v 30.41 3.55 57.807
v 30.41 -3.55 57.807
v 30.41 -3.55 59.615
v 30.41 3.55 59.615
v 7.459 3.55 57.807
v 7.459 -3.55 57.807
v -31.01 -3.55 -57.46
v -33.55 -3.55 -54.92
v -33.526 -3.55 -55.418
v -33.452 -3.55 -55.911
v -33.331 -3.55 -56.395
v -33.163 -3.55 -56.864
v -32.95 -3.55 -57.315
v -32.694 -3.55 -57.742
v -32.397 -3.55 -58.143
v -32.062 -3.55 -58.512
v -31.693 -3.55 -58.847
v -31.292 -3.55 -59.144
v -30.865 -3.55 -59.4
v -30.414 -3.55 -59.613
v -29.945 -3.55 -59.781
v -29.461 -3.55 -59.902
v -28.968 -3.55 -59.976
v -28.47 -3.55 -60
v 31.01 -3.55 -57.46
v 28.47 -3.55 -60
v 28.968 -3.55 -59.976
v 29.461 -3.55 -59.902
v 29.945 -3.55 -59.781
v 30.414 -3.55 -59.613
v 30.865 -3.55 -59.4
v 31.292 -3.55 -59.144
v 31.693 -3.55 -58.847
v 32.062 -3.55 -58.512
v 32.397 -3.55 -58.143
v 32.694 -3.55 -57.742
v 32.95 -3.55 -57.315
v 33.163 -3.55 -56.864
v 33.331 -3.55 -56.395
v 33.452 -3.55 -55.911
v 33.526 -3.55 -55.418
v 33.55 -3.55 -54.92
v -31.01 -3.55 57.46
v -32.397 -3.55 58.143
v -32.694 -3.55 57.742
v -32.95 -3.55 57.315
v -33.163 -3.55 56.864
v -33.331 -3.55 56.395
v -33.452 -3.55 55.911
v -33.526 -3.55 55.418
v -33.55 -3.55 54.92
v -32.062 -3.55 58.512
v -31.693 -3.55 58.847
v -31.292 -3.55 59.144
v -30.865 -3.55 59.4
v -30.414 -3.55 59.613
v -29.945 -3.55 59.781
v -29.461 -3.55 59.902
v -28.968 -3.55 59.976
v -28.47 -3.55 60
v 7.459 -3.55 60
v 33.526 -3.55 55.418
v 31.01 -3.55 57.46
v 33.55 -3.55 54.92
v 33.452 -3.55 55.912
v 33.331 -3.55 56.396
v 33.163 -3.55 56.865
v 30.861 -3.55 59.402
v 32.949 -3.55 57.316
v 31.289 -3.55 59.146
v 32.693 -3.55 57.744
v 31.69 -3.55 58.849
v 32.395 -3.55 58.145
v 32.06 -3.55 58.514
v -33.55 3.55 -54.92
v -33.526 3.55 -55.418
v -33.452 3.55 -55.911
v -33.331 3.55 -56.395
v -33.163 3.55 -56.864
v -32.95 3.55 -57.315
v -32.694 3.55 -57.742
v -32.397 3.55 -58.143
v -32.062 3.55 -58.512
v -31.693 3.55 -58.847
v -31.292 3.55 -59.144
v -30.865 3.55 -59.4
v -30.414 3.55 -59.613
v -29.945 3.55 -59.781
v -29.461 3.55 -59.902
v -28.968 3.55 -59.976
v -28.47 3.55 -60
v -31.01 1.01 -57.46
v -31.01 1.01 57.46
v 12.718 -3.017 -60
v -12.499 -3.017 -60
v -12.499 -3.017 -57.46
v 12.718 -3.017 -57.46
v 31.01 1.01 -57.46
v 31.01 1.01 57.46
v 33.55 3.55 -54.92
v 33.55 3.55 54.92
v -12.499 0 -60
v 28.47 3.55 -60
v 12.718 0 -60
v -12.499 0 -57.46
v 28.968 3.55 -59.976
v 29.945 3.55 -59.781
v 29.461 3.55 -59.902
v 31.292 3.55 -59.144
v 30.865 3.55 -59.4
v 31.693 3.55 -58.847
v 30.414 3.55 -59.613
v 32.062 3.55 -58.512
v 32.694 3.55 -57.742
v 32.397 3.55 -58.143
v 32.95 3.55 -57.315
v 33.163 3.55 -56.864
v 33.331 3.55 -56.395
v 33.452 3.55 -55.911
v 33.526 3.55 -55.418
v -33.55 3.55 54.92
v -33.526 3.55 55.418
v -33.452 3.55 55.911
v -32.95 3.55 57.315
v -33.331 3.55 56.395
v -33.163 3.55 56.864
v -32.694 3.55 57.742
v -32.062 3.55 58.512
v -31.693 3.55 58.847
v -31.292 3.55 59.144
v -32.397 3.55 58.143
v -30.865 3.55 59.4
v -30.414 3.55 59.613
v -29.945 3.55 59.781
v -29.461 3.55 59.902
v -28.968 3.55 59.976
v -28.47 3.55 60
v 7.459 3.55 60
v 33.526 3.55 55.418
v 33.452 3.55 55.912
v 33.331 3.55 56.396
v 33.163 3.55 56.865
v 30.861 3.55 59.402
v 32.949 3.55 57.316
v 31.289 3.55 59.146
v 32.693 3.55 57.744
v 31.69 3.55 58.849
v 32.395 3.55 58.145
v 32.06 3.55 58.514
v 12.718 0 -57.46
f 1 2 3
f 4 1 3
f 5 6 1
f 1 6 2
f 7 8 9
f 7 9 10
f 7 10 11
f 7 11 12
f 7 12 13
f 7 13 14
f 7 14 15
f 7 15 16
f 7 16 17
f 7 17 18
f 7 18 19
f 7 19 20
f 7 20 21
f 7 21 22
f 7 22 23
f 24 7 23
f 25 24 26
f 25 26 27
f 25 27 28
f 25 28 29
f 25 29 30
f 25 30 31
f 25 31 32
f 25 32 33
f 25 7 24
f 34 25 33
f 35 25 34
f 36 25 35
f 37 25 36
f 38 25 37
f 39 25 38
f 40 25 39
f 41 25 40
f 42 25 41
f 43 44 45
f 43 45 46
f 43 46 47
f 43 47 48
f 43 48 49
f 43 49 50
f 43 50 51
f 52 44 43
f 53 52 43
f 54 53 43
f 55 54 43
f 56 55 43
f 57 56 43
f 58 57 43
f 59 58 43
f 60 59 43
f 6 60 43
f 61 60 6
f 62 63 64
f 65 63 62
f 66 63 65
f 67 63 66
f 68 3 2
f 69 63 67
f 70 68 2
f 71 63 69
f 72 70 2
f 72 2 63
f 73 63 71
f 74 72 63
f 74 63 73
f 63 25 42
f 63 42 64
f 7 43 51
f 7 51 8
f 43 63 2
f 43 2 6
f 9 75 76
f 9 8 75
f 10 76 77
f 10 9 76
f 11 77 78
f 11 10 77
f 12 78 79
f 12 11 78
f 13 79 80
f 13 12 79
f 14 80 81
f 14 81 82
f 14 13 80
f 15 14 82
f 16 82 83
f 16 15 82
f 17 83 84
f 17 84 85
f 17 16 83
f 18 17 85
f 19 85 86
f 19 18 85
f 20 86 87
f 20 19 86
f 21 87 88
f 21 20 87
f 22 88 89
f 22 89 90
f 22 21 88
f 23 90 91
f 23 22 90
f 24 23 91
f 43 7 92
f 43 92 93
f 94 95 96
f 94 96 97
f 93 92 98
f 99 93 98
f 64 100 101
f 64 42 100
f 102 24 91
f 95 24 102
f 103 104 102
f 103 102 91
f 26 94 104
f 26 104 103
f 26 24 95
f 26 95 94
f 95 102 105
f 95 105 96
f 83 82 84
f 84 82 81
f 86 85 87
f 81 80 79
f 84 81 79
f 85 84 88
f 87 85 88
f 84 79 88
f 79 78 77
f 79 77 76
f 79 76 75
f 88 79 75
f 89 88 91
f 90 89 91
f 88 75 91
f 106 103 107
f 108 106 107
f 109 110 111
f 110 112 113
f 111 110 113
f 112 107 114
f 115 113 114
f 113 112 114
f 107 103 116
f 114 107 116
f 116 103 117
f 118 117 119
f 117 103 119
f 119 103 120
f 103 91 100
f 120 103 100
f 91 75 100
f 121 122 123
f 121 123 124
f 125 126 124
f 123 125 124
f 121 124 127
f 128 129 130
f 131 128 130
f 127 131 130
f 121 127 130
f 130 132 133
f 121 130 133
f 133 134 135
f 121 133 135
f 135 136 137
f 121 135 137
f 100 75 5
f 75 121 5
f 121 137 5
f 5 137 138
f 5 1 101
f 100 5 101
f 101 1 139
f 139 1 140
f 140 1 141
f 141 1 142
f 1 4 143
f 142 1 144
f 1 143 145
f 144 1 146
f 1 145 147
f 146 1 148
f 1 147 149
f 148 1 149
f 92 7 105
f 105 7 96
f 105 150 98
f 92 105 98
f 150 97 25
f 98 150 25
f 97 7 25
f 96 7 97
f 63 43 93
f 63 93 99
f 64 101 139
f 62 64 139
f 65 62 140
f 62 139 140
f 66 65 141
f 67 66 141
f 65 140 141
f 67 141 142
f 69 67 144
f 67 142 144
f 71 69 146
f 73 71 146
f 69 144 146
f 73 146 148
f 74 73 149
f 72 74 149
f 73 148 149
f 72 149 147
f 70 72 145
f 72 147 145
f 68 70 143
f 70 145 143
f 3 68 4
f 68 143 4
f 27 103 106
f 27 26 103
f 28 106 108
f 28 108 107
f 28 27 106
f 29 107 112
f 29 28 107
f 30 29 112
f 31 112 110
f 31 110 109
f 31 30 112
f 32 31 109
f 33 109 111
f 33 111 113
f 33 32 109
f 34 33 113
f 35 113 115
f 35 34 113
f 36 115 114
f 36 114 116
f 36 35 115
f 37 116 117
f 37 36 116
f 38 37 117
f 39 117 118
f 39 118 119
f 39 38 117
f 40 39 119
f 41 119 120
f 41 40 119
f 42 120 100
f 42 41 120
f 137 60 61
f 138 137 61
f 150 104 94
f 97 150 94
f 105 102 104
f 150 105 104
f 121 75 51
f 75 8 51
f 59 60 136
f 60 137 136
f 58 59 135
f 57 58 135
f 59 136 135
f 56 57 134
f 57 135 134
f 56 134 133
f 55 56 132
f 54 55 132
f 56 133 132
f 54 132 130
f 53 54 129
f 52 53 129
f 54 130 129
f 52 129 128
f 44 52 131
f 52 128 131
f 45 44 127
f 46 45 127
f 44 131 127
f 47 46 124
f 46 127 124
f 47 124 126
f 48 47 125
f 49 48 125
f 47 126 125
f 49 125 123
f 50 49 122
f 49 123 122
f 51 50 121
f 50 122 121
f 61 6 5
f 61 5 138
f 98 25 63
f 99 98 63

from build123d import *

# Parameters (mm, degrees)
F0_W      = 67.1
F0_H      = 120
F1_DEPTH  = 3.55
F2_T      = -2.54
F3_R      = 5.08
F4_R      = 5.08
F5_R      = 5.08
F6_R      = 5.08
F7_W      = 22.950821
F7_H      = 8.032788
F8_DEPTH  = 12.5
F9_W      = 25.217273
F9_H      = 3.016623
F10_DEPTH = 12.5


with BuildPart() as f1:
    # F0 (on Front) → F1 (new body, symmetric)
    with BuildSketch(Plane.XZ):
        Rectangle(F0_W, F0_H)
    extrude(amount=F1_DEPTH, both=True)

    # F2
    f2_openings = [f1.faces().sort_by_distance(p)[0] for p in [
        (0, -3.55, 0),
    ]]
    offset(amount=F2_T, openings=f2_openings)

    # F3
    f3_edges = [f1.edges().sort_by_distance(p)[0] for p in [
        (33.55, 0, 60),
    ]]
    fillet(f3_edges, radius=F3_R)

    # F4
    f4_edges = [f1.edges().sort_by_distance(p)[0] for p in [
        (-33.55, 0, 60),
    ]]
    fillet(f4_edges, radius=F4_R)

    # F5
    f5_edges = [f1.edges().sort_by_distance(p)[0] for p in [
        (-33.55, 0, -60),
    ]]
    fillet(f5_edges, radius=F5_R)

    # F6
    f6_edges = [f1.edges().sort_by_distance(p)[0] for p in [
        (33.55, 0, -60),
    ]]
    fillet(f6_edges, radius=F6_R)

    # F7 (on Front) → F8 (cut, symmetric)
    with BuildSketch(Plane.XZ):
        with Locations((18.934428, 61.823776)):
            Rectangle(F7_W, F7_H)
    extrude(amount=F8_DEPTH, both=True, mode=Mode.SUBTRACT)

    # F9 (on face) → F10 (cut, symmetric)
    with BuildSketch(Plane(origin=(0, 0, -60), x_dir=(1, 0, 0), z_dir=(0, 0, -1))):
        with Locations((0.109307, 1.508312)):
            Rectangle(F9_W, F9_H)
    extrude(amount=F10_DEPTH, both=True, mode=Mode.SUBTRACT)


solid = f1.part
